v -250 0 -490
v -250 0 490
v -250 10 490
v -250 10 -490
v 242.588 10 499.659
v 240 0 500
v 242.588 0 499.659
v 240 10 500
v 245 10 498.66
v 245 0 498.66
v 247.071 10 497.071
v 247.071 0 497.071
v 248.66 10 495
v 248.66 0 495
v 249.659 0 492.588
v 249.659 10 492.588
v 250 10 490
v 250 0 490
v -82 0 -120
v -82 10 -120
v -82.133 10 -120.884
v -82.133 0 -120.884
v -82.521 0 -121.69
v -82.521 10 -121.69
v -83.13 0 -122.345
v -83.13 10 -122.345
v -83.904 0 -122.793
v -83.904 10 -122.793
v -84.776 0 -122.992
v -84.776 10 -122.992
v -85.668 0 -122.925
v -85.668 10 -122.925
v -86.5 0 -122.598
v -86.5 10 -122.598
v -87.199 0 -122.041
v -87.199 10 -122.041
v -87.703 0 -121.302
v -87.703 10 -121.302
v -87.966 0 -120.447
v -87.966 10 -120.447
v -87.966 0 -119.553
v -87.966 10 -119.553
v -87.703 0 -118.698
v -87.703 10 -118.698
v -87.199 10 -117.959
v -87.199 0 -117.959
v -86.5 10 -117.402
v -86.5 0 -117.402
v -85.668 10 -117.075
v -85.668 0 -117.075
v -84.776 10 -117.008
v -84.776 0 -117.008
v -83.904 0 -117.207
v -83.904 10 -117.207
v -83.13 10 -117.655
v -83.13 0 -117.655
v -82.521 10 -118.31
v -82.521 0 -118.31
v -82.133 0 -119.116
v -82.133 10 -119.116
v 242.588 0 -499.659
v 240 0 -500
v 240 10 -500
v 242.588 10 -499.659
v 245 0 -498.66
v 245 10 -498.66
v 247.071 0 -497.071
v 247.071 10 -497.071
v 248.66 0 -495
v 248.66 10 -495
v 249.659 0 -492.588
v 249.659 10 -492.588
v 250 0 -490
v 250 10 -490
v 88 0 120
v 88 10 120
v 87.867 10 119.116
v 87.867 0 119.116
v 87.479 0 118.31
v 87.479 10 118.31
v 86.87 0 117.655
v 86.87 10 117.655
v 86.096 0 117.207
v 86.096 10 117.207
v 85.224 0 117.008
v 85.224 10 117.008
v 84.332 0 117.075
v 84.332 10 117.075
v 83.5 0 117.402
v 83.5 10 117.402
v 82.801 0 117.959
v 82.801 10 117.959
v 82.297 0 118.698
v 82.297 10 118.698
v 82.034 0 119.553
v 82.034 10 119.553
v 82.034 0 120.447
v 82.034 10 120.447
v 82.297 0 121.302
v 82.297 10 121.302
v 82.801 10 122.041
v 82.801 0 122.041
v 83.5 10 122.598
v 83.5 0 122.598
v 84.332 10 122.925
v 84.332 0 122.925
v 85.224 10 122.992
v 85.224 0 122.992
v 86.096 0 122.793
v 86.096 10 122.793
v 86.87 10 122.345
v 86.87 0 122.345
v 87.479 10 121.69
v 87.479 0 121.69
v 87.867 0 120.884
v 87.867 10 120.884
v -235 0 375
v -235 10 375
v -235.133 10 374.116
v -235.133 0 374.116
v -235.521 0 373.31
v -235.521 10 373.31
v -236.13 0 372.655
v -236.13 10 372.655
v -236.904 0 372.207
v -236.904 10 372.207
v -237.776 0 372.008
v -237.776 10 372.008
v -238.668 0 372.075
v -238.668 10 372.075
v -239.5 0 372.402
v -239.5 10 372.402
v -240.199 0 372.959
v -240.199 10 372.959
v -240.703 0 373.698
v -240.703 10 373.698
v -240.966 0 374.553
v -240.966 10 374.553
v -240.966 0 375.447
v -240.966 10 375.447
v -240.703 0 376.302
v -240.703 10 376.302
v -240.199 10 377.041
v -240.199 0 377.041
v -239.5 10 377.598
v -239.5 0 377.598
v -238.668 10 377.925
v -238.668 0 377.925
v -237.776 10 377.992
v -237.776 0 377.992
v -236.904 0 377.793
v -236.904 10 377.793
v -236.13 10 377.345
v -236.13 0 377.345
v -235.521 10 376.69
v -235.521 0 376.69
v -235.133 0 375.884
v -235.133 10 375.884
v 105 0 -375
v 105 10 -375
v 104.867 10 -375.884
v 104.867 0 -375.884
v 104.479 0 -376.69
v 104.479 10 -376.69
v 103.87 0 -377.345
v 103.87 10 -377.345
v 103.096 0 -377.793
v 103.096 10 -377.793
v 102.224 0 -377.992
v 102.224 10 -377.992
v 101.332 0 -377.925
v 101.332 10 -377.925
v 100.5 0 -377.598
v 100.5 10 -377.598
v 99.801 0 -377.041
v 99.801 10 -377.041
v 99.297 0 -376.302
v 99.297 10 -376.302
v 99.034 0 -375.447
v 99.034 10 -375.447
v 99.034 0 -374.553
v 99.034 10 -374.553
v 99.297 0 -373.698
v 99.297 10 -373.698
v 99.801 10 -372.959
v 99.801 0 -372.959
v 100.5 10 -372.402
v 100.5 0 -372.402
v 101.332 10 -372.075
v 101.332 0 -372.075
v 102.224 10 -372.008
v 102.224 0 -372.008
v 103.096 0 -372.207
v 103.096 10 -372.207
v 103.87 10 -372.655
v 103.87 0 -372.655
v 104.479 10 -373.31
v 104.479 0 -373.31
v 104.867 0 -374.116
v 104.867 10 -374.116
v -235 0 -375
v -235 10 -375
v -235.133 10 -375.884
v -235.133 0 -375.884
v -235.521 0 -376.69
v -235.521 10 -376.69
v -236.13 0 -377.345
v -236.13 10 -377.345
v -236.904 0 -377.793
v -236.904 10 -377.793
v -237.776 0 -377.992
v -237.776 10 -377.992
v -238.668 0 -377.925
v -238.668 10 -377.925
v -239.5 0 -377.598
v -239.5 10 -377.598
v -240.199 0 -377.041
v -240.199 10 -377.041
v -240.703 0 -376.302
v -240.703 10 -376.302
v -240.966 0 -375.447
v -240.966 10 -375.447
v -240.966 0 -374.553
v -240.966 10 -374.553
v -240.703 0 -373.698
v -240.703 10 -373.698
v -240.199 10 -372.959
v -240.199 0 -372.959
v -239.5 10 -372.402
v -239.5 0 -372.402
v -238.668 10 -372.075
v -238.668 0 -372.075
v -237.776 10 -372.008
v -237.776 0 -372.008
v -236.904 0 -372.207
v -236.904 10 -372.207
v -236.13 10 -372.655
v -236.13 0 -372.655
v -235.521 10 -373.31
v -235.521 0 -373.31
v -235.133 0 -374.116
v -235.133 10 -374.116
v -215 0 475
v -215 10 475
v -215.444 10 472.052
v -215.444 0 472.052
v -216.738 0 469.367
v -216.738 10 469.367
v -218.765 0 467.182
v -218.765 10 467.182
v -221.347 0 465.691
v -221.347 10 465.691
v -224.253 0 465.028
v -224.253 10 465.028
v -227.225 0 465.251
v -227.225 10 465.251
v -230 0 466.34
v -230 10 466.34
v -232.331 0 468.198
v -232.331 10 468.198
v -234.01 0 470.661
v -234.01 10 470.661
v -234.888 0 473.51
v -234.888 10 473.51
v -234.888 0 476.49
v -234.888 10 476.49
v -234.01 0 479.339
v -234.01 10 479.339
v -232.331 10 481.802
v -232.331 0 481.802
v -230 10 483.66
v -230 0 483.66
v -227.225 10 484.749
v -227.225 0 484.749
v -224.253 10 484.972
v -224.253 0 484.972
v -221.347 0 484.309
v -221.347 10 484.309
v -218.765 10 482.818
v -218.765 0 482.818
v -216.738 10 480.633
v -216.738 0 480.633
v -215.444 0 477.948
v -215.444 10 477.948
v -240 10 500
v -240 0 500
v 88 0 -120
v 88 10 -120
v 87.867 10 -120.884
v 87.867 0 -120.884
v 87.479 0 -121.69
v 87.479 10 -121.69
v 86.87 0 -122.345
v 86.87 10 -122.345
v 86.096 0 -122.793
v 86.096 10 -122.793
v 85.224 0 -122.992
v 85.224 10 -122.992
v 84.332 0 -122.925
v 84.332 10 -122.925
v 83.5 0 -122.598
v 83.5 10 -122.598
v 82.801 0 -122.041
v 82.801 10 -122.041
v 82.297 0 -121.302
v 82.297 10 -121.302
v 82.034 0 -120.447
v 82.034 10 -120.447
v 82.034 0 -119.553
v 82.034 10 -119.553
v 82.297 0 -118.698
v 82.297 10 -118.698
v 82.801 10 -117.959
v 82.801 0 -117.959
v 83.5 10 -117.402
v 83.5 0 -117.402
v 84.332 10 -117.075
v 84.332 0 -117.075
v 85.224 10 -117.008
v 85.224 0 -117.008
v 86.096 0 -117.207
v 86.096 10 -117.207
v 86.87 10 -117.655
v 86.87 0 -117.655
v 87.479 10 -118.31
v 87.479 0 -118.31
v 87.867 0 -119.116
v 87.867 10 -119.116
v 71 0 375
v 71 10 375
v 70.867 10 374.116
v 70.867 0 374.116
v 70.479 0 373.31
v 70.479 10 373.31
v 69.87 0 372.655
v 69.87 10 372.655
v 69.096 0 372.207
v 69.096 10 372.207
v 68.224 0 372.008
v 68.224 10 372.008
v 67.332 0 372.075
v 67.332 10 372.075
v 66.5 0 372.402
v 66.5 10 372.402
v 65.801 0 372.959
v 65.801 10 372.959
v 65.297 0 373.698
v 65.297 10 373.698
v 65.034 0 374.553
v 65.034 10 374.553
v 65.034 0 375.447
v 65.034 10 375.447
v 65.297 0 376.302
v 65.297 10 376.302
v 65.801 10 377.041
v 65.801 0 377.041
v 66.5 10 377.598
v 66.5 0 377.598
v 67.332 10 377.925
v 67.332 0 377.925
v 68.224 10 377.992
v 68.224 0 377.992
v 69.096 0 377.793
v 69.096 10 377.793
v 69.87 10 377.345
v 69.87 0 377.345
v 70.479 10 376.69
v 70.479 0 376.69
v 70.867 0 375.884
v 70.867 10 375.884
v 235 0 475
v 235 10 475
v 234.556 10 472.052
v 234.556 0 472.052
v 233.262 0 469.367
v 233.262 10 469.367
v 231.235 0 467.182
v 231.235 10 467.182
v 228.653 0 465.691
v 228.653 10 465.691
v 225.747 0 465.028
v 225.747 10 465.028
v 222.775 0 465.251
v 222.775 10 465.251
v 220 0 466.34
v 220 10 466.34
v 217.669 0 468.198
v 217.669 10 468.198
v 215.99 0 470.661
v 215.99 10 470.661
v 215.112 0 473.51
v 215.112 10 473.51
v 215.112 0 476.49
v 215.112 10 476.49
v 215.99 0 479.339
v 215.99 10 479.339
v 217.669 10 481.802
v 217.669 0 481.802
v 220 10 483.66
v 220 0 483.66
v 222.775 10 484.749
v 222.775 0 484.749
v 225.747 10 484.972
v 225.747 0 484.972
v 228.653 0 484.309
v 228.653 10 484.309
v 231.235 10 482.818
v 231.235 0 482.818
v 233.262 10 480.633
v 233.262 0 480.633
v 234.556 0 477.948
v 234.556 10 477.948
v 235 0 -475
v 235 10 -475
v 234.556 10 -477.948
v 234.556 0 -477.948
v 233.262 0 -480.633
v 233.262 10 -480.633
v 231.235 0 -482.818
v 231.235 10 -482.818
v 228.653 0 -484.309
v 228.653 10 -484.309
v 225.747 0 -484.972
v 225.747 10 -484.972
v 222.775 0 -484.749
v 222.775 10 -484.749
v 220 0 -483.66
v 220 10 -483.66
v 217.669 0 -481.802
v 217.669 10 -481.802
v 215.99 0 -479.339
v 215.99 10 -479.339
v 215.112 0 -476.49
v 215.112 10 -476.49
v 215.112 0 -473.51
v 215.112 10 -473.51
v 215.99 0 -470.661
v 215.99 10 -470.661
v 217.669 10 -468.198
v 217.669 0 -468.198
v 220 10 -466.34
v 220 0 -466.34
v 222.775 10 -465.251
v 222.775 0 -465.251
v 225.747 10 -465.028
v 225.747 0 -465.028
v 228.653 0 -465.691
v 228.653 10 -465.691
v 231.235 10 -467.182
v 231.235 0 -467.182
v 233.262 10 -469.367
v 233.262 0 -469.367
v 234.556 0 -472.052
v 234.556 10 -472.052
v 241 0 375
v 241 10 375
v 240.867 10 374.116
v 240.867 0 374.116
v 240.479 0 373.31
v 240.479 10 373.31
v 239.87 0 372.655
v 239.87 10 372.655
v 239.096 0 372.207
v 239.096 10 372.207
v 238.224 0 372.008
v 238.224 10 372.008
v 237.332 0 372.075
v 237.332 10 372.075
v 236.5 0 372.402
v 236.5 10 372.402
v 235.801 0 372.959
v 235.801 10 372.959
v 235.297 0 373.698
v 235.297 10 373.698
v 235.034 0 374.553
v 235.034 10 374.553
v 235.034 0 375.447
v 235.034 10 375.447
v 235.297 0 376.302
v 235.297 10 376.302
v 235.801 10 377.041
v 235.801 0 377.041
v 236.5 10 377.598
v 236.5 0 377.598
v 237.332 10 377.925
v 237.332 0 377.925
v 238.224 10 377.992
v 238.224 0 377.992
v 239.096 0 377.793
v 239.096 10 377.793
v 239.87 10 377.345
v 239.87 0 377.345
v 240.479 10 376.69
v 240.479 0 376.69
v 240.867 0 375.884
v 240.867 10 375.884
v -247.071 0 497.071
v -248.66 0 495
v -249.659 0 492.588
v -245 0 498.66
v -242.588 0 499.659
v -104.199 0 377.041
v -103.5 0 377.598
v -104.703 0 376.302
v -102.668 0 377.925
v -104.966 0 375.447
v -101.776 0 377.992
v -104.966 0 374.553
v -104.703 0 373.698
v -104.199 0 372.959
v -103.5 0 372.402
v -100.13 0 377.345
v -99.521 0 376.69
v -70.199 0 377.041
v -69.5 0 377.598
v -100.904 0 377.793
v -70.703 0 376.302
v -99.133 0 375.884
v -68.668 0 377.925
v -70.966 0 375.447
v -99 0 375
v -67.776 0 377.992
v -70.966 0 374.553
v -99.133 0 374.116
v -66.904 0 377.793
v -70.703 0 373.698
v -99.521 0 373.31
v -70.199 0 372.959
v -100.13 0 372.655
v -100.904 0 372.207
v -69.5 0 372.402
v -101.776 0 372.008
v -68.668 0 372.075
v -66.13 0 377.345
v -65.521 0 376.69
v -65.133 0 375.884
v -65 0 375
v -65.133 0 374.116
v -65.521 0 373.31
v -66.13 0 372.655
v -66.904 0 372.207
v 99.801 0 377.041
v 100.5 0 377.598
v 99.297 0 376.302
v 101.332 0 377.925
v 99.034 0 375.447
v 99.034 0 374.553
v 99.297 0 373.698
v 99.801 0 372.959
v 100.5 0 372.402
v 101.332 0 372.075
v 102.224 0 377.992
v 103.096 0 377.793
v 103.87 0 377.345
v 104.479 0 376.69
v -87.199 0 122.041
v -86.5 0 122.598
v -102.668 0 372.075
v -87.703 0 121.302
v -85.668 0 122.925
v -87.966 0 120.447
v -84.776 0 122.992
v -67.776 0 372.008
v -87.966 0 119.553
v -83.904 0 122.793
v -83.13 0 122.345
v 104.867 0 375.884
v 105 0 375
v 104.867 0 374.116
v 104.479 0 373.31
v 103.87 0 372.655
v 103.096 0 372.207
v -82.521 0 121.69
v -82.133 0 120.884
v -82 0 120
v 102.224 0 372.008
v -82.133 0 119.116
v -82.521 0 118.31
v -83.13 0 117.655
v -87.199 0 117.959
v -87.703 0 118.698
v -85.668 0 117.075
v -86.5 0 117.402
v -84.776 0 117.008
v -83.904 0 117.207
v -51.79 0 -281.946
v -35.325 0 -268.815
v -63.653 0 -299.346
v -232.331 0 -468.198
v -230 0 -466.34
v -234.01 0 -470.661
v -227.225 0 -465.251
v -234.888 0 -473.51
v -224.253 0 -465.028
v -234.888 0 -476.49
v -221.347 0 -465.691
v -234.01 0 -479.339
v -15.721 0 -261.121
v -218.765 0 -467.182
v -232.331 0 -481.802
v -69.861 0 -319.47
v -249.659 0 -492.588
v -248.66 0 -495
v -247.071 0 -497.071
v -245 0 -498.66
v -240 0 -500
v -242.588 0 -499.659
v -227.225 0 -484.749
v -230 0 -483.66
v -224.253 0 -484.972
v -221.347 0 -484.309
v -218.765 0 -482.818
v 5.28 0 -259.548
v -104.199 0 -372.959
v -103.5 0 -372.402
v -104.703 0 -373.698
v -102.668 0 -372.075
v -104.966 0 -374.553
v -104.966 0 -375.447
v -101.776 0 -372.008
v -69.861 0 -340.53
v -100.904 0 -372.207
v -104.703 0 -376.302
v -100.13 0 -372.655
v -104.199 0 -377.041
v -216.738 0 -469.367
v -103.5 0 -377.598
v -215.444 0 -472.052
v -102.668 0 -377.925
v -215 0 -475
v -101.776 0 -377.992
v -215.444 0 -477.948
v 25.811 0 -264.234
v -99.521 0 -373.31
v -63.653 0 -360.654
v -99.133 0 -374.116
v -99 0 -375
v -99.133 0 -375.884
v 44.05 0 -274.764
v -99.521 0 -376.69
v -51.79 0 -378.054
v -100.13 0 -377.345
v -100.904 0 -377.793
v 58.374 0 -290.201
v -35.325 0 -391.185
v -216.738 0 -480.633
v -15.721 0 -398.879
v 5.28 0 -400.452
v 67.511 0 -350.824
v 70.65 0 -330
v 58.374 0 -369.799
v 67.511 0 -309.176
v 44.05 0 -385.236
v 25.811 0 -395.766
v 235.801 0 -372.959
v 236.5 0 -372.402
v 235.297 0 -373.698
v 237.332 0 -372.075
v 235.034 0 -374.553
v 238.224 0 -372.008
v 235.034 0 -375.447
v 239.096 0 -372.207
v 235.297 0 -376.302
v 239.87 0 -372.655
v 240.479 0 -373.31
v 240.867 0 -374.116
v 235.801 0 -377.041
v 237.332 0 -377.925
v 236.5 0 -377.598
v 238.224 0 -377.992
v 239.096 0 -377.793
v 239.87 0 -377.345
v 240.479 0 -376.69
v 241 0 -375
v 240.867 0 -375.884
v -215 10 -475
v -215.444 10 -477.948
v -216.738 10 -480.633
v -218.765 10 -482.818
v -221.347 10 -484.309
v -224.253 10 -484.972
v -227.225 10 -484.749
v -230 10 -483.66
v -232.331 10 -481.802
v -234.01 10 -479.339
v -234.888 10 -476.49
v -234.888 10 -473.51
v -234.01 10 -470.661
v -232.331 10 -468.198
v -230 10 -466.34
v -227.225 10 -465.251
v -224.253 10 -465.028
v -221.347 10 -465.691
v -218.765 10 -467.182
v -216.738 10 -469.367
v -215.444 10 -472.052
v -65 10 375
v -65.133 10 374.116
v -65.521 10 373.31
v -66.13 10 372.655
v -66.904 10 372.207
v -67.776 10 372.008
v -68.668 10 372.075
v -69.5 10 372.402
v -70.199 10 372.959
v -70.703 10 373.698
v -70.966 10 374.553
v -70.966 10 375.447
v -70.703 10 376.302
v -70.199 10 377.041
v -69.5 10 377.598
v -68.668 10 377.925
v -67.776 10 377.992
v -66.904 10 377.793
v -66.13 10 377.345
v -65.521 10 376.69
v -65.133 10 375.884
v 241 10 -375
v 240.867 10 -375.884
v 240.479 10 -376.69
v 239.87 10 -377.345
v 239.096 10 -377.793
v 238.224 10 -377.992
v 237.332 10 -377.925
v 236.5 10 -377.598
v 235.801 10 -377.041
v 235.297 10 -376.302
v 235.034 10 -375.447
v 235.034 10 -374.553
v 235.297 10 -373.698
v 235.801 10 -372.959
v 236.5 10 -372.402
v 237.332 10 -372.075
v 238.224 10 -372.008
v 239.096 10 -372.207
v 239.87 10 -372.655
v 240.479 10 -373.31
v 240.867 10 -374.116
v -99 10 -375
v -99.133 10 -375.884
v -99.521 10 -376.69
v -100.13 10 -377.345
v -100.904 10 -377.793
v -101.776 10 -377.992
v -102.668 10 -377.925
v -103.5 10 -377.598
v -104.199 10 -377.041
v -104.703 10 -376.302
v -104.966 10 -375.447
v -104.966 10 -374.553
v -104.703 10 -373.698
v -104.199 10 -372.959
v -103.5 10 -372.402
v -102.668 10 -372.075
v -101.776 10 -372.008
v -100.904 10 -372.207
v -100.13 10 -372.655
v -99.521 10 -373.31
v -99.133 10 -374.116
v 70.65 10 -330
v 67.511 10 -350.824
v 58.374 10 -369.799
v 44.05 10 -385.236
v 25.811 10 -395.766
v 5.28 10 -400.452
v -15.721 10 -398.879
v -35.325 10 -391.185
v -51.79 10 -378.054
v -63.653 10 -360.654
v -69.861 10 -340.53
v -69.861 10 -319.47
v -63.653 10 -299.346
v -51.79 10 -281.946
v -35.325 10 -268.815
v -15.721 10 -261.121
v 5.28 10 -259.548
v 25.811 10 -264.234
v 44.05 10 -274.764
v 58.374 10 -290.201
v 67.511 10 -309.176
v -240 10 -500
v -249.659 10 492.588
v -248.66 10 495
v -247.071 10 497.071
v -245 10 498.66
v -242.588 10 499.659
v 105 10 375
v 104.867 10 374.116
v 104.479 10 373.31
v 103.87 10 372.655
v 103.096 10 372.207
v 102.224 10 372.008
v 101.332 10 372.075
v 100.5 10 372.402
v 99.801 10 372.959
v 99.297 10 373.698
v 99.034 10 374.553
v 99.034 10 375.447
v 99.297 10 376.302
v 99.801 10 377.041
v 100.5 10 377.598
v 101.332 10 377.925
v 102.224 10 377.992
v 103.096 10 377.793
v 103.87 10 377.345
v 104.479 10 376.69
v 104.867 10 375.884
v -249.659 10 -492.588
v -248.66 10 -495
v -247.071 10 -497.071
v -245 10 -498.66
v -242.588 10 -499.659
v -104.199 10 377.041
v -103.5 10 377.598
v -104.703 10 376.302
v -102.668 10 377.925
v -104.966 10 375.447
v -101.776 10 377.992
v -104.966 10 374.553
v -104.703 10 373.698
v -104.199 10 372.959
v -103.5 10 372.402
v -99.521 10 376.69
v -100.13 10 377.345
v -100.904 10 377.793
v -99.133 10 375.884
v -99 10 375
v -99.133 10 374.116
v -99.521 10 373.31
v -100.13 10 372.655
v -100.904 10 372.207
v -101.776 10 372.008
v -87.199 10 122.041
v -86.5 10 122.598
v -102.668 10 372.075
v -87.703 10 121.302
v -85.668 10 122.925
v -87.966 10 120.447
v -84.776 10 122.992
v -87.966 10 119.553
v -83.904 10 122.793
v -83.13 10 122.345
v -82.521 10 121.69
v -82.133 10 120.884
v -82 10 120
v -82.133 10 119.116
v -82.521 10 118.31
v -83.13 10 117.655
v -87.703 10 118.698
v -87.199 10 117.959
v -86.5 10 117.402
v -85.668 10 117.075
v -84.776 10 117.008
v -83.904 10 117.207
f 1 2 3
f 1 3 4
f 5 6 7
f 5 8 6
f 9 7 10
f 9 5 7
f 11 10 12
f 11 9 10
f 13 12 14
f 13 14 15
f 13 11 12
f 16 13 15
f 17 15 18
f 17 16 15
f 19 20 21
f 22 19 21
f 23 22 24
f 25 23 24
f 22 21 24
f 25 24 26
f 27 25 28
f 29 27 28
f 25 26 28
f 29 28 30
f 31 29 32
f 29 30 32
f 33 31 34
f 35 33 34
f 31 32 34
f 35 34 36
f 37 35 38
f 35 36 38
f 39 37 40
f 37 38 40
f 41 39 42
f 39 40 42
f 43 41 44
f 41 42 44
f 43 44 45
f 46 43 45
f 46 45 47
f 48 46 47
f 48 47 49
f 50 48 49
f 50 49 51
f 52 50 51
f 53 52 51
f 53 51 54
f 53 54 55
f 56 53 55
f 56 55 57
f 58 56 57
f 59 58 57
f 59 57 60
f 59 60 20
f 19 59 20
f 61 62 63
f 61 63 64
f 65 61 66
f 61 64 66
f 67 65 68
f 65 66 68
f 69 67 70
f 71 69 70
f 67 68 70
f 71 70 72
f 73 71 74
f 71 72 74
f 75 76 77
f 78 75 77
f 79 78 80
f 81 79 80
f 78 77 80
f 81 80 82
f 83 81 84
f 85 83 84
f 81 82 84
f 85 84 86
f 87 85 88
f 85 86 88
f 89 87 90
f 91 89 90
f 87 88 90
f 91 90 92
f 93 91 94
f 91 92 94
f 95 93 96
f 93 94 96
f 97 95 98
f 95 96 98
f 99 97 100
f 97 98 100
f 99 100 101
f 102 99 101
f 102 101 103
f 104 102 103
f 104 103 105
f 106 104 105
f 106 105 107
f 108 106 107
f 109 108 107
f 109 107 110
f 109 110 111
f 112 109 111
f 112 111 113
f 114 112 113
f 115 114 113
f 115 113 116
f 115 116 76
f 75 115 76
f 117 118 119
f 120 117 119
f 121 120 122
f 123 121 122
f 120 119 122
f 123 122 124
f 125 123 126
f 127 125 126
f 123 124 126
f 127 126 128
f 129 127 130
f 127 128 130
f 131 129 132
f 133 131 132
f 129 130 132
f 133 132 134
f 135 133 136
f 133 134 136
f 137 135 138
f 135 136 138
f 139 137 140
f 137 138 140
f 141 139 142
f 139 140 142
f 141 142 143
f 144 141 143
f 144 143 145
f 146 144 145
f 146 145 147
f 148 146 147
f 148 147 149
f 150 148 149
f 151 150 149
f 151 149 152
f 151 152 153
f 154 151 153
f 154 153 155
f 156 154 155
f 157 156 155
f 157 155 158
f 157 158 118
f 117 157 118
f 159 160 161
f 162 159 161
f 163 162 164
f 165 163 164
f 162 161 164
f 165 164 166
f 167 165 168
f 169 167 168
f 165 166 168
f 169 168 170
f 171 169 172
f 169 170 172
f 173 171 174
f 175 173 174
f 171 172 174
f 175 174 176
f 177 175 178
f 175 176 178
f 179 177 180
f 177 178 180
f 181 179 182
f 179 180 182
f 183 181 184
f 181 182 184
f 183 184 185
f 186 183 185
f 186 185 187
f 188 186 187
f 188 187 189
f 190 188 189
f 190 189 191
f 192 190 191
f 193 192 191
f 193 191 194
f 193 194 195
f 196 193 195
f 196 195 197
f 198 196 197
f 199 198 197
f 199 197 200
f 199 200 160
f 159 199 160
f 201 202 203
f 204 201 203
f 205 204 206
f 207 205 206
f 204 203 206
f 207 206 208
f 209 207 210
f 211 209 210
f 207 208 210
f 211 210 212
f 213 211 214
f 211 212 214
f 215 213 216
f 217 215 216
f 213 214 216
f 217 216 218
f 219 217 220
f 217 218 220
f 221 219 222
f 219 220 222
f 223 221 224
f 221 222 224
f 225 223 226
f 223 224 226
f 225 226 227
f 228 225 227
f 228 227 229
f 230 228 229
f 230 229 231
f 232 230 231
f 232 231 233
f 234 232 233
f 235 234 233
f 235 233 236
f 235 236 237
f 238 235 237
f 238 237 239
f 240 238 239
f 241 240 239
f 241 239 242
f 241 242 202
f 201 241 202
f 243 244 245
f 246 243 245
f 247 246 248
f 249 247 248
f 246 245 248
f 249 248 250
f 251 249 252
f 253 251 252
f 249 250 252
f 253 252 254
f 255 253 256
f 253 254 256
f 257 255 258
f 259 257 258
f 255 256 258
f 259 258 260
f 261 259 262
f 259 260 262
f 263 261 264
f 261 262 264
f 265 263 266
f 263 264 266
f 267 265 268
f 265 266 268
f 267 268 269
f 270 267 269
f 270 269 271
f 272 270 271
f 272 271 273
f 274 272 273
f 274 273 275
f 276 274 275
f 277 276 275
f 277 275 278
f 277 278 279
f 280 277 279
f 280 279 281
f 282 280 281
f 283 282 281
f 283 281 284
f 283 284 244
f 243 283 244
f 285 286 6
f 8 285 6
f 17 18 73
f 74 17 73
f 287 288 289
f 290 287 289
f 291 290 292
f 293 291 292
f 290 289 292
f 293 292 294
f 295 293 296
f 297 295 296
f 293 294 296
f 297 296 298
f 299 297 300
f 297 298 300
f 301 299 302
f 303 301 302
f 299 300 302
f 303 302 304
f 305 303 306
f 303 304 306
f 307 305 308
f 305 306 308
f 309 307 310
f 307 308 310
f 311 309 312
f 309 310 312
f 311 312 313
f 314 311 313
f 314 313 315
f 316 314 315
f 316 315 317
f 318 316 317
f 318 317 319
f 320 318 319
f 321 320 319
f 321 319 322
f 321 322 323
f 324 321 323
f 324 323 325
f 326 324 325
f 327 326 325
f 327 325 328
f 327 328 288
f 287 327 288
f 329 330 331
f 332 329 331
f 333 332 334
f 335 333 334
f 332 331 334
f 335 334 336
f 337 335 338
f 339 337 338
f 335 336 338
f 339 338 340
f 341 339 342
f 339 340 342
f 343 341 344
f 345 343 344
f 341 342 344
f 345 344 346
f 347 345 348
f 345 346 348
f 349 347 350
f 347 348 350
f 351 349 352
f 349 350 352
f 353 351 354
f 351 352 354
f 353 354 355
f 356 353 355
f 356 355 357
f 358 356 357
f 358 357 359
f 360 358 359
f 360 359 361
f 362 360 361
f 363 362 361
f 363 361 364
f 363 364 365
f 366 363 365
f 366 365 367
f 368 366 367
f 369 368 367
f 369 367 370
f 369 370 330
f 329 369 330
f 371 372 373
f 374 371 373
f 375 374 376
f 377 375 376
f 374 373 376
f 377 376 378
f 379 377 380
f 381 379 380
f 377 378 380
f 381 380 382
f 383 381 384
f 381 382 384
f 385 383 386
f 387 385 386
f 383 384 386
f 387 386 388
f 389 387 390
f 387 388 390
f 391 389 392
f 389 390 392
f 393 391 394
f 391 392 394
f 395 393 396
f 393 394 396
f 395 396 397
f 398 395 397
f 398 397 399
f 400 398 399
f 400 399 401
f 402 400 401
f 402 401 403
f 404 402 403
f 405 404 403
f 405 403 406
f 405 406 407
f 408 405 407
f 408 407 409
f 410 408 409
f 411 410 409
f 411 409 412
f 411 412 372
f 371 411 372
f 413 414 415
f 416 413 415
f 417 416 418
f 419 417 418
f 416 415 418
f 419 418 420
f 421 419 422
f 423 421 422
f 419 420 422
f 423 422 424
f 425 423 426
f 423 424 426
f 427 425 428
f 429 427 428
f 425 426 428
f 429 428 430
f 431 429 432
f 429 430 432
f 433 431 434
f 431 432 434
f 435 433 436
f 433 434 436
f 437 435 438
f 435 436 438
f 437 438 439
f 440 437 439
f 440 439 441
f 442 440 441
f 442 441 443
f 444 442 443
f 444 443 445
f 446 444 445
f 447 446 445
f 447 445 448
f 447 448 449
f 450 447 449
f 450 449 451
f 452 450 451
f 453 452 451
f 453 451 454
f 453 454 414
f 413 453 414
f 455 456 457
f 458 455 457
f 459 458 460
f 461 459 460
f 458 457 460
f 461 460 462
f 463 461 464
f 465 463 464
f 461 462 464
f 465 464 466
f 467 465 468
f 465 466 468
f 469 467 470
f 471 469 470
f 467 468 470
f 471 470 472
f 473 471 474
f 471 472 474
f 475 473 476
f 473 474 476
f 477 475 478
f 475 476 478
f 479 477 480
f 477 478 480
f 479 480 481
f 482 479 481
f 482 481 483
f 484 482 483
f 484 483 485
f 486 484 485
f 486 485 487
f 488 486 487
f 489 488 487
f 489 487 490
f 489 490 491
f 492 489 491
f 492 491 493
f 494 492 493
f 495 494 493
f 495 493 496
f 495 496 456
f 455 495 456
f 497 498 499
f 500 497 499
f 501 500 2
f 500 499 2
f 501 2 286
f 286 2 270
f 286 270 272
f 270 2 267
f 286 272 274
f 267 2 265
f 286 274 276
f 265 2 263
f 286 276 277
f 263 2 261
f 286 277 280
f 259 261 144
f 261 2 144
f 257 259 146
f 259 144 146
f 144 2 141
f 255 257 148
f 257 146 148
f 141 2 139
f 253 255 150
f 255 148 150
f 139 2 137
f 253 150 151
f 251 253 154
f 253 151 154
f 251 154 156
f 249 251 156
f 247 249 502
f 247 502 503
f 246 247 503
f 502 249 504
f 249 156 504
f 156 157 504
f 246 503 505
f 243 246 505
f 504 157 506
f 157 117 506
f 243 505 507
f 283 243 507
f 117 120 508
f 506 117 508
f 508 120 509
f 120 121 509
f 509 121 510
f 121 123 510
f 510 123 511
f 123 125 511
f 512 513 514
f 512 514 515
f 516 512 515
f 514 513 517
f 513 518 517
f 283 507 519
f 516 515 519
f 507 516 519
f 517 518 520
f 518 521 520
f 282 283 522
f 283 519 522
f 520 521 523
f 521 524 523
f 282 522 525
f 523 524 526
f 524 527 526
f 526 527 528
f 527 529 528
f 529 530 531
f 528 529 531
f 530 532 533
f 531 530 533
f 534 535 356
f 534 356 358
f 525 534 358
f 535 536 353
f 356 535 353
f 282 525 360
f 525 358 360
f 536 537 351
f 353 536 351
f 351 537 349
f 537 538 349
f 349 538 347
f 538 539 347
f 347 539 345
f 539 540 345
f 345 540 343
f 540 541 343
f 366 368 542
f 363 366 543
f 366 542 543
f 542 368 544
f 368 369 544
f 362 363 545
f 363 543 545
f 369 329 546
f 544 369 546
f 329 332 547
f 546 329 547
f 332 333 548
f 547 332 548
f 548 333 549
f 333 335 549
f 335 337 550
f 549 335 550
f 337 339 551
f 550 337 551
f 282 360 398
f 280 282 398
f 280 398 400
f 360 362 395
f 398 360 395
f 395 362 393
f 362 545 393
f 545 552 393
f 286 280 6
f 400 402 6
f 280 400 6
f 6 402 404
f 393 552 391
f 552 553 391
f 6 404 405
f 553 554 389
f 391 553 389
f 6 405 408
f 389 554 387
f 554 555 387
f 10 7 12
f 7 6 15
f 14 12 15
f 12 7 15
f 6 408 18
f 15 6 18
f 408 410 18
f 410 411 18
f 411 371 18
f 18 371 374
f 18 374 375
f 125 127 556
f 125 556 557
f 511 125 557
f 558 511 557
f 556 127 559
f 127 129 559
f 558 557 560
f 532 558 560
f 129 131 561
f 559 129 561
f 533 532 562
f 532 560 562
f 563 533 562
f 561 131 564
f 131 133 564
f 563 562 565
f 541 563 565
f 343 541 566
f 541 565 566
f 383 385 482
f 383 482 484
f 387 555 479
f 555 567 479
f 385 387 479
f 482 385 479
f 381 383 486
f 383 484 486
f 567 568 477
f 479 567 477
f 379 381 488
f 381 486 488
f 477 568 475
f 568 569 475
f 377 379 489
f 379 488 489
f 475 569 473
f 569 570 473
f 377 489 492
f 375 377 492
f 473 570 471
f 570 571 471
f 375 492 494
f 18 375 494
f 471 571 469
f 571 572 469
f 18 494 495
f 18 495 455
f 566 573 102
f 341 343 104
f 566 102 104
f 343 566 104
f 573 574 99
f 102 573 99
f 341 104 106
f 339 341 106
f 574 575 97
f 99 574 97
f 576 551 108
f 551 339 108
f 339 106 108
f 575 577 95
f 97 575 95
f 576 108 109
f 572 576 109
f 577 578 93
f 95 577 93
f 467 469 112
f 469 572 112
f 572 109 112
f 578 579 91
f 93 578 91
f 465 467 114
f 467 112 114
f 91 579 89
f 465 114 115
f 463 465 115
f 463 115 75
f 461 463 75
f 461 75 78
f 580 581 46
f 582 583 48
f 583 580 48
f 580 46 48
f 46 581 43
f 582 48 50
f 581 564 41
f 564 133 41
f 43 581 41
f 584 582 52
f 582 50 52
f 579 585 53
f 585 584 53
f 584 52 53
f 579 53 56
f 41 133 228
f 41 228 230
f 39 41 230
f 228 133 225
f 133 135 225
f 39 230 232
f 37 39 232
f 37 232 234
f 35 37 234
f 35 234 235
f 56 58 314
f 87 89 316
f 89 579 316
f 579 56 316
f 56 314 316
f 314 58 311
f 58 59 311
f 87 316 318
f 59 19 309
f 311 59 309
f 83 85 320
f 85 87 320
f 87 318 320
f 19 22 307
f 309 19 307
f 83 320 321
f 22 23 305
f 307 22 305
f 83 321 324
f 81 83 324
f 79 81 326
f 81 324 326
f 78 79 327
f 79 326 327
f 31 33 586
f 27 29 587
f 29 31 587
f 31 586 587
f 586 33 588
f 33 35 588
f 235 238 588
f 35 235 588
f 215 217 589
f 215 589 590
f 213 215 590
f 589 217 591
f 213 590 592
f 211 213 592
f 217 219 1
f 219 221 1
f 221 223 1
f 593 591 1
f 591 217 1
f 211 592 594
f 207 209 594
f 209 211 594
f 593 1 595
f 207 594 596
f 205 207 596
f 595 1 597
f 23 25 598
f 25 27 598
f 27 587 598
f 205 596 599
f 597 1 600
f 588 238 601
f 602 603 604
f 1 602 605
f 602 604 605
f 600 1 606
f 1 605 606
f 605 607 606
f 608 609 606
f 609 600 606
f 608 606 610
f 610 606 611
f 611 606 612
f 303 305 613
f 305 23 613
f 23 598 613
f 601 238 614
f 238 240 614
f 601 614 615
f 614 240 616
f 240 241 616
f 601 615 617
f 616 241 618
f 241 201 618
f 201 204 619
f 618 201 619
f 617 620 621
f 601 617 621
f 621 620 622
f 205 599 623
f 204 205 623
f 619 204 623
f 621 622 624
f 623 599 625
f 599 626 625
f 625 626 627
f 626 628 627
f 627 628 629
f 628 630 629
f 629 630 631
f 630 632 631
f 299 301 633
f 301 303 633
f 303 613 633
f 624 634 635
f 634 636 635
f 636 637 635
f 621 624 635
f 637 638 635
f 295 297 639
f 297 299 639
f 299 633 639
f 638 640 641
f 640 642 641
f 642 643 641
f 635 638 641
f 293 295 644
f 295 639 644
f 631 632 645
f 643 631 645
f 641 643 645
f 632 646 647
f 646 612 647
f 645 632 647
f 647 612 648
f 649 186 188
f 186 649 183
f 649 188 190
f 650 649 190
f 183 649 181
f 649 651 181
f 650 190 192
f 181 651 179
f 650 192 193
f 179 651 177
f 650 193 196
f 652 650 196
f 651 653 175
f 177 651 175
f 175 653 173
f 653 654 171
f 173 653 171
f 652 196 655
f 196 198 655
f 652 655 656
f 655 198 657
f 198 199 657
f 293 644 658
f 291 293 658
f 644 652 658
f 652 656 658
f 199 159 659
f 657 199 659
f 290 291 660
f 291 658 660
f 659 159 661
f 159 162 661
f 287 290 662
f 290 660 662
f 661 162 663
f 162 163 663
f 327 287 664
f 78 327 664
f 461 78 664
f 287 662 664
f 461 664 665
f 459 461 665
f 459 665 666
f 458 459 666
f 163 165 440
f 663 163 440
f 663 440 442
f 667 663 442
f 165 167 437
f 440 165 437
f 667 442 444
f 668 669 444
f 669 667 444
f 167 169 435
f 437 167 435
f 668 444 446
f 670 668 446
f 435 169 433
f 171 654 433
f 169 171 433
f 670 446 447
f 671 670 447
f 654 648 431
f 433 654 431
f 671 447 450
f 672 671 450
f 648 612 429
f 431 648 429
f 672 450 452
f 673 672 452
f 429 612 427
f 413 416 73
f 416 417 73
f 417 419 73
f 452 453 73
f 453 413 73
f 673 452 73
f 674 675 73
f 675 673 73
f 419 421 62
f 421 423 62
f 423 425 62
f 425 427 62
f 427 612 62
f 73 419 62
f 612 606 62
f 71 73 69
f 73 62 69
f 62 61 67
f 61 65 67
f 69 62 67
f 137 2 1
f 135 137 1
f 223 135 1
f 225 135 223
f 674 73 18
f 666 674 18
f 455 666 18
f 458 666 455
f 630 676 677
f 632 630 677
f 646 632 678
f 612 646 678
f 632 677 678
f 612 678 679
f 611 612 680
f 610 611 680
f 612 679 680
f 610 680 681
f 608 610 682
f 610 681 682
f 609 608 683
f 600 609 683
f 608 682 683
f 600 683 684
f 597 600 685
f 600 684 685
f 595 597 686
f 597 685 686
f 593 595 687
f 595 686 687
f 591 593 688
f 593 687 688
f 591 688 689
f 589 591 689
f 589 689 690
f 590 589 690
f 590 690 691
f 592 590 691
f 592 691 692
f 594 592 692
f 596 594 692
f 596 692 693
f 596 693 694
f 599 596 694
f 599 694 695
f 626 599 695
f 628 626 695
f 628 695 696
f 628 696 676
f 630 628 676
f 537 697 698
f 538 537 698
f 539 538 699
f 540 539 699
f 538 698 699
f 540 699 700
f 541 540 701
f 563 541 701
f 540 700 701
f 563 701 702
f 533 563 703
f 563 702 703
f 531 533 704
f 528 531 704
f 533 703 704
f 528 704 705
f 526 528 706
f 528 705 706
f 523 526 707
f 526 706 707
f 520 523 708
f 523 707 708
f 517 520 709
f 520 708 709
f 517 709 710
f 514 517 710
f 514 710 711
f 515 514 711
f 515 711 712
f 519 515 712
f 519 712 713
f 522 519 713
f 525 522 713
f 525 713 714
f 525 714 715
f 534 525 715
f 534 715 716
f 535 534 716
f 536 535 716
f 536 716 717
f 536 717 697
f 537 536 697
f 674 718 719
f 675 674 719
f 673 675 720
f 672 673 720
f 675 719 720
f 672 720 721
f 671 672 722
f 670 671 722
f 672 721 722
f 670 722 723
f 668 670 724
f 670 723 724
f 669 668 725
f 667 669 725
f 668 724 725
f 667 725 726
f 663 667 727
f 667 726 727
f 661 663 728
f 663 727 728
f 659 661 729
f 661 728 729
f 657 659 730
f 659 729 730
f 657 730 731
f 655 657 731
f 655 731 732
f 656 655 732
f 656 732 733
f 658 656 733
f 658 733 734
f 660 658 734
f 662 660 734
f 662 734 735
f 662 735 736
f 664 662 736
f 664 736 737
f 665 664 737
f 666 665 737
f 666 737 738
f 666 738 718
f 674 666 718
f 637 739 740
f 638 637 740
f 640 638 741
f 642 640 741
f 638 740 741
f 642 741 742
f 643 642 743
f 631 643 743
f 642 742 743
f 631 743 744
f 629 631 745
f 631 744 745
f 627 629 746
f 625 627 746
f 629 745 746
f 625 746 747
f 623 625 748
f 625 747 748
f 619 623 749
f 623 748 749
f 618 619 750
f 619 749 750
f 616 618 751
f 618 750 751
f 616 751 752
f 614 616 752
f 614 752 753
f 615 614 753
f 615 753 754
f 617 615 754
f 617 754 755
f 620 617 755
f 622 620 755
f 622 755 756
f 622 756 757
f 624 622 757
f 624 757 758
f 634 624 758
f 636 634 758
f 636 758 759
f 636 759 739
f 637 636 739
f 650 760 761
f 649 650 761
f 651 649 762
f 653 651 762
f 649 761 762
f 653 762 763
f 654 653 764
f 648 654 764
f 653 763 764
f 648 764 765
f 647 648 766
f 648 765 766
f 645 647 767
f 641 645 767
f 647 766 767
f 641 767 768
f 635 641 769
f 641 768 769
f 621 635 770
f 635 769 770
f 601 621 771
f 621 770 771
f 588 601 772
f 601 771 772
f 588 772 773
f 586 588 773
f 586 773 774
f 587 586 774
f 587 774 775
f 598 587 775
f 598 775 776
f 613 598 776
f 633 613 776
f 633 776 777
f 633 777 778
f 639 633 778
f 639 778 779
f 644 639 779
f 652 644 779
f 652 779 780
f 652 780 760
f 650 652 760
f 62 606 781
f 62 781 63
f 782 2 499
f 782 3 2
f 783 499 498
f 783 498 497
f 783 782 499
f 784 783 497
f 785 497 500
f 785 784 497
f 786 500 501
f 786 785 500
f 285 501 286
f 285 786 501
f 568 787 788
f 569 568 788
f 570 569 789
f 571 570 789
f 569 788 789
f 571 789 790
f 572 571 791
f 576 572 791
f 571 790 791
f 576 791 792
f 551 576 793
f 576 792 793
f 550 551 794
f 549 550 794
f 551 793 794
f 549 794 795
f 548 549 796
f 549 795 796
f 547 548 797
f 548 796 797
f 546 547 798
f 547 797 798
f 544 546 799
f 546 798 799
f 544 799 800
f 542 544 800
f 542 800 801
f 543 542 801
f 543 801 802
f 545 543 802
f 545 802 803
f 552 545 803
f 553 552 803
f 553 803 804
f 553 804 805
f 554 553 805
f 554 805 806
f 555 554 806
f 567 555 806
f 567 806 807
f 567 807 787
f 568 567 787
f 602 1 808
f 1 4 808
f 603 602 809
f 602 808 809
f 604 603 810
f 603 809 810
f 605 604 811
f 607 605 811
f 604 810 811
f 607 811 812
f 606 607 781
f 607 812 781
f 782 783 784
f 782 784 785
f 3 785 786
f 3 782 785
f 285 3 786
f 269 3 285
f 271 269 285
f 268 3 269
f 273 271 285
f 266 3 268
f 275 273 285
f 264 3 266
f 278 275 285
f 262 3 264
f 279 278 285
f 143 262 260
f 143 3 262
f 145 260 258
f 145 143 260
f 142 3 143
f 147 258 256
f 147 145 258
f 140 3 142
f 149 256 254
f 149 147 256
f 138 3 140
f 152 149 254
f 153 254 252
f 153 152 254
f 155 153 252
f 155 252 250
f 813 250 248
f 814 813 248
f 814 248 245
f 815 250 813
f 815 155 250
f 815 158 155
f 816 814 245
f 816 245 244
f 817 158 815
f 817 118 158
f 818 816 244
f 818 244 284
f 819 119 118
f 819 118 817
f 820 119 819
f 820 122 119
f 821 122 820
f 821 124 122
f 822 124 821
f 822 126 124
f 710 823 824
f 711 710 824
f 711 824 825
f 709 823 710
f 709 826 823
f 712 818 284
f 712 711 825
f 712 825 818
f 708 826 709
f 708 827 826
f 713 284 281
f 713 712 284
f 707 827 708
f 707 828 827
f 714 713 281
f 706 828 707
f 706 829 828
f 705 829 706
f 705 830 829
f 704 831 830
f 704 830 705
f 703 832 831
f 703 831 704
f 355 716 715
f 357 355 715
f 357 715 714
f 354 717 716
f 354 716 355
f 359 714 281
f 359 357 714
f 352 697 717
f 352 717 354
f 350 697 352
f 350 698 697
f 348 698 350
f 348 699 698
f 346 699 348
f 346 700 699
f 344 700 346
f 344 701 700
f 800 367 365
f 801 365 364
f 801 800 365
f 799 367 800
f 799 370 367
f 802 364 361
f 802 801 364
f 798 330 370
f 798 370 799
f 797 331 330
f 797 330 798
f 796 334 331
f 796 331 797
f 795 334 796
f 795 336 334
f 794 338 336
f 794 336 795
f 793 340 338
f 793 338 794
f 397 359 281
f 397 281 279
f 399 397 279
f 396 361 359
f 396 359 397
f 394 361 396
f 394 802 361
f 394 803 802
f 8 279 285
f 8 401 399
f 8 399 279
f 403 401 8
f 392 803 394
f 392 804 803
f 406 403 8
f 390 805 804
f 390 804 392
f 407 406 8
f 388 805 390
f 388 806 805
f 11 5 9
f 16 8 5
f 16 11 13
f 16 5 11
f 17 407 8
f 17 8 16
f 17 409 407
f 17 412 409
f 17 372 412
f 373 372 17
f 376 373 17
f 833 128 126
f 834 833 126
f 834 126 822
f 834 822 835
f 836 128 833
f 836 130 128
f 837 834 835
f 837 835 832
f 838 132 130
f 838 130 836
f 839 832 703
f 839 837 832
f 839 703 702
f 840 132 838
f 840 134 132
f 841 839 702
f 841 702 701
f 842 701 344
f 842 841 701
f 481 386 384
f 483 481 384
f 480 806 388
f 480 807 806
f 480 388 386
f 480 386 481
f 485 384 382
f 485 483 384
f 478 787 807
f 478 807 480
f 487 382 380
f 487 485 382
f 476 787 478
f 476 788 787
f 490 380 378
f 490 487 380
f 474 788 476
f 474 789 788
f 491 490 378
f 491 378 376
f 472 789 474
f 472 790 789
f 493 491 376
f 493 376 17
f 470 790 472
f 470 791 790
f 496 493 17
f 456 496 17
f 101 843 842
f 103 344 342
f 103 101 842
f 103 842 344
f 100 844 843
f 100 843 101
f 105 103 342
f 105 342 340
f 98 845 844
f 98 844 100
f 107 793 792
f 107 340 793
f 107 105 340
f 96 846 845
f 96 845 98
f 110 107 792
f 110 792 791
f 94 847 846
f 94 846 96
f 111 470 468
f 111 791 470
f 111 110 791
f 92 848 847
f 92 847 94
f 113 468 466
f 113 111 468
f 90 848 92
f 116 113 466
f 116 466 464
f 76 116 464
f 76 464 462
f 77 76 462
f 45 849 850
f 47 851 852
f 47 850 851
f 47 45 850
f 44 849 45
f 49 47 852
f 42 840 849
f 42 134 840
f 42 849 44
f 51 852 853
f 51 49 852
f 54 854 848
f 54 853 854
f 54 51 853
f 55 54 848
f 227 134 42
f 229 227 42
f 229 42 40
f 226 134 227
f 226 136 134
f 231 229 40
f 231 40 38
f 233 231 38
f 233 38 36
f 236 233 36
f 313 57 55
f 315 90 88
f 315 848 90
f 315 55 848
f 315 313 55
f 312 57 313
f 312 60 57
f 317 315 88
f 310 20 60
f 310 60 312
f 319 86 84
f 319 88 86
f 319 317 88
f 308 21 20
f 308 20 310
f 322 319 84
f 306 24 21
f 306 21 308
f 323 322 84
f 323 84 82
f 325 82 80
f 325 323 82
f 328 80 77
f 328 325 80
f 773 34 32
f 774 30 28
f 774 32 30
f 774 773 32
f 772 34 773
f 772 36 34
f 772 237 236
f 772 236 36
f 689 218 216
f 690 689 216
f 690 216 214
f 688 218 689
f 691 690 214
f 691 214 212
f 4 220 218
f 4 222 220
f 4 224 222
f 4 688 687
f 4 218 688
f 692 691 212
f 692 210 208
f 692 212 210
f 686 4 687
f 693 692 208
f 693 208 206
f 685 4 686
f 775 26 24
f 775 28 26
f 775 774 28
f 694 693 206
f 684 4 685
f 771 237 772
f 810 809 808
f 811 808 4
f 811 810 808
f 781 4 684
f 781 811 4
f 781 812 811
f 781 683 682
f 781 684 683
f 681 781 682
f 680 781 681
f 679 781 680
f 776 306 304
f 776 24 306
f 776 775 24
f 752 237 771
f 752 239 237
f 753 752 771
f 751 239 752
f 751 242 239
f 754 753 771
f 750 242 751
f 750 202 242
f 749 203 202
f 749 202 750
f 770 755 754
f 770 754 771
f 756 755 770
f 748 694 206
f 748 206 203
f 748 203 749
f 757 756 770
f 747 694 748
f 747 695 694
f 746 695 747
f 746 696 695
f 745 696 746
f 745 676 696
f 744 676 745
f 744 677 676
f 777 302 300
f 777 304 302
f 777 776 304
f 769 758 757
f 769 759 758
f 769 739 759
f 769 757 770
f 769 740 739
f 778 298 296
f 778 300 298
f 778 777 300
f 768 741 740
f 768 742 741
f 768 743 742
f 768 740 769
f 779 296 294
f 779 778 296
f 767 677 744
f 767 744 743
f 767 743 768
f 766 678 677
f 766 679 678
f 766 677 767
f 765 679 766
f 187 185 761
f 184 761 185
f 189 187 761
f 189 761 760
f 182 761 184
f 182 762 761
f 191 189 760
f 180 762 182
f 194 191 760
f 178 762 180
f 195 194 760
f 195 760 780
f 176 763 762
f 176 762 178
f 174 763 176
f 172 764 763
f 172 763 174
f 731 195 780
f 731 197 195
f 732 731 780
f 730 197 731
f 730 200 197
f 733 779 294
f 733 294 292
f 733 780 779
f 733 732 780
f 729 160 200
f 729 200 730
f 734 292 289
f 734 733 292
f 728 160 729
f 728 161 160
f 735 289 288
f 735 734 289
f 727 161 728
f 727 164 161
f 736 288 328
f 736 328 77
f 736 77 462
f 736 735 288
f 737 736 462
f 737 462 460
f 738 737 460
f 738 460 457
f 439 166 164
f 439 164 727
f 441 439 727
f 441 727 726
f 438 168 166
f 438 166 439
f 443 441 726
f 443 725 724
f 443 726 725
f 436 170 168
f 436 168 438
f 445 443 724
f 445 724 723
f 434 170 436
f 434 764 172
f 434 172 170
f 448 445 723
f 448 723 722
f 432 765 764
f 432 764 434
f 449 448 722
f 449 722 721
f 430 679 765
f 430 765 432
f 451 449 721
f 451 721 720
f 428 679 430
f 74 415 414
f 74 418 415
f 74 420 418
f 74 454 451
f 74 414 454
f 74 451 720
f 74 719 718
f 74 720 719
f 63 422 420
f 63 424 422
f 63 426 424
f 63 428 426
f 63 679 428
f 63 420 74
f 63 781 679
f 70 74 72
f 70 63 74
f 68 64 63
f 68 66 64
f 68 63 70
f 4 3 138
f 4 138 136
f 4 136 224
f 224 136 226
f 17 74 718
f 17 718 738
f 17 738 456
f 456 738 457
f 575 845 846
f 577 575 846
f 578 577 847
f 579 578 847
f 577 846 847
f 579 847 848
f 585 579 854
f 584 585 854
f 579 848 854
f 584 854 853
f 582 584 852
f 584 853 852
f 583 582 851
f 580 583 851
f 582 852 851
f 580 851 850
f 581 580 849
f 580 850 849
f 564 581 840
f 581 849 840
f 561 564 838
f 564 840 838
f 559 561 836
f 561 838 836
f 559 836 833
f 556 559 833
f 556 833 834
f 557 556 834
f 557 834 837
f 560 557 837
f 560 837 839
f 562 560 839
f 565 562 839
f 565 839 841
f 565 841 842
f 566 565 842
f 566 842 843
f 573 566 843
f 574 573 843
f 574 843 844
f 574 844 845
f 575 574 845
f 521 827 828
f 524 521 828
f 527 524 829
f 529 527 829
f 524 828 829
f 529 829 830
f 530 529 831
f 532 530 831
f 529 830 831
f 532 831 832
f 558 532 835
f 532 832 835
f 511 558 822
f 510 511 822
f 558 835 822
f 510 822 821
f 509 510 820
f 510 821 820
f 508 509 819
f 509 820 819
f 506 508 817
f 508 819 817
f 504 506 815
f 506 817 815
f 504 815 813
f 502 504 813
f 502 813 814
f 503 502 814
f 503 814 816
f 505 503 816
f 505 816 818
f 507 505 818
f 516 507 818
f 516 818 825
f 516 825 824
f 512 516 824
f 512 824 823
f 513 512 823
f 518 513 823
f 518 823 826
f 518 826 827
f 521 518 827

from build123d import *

# Parameters (mm, degrees)
SKETCH1_W                  = 500
SKETCH1_H                  = 1000
BOSS_EXTRUDE1_DEPTH        = 10
LO_BAT_XUONG_DAT_REACH     = 12
SKETCH2_R                  = 10
FILLET1_R                  = 10
CUT_EXTRUDE2_REACH         = 12
SKETCH3_R                  = 70.65
BAT_CHAN_DE_KHOP_NOI_REACH = 12
SKETCH4_R                  = 3
CUT_EXTRUDE3_REACH         = 12
SKETCH6_R                  = 3


with BuildPart() as part:
    # Sketch1 → Boss-Extrude1 (new body)
    with BuildSketch(Plane(origin=(0, 0, 0), x_dir=(1, 0, 0), z_dir=(0, 1, 0))):
        Rectangle(SKETCH1_W, SKETCH1_H)
    extrude(amount=BOSS_EXTRUDE1_DEPTH)

    # Sketch2 → lo bat xuong dat (cut, up to next)
    with BuildSketch(Plane(origin=(0, 10, 0), x_dir=(1, 0, 0), z_dir=(0, 1, 0)), mode=Mode.PRIVATE) as lo_bat_xuong_dat_sk1:
        with Locations((-225, 475)):
            Circle(SKETCH2_R)
    lo_bat_xuong_dat_tool1 = extrude(lo_bat_xuong_dat_sk1.sketch, amount=-LO_BAT_XUONG_DAT_REACH, mode=Mode.PRIVATE) & part.part
    add(lo_bat_xuong_dat_tool1.solids().sort_by_distance((-225, 10, -475))[0], mode=Mode.SUBTRACT)
    # Sketch2 → lo bat xuong dat (cut, up to next)
    with BuildSketch(Plane(origin=(0, 10, 0), x_dir=(1, 0, 0), z_dir=(0, 1, 0)), mode=Mode.PRIVATE) as lo_bat_xuong_dat_sk2:
        with Locations((225, 475)):
            Circle(SKETCH2_R)
    lo_bat_xuong_dat_tool2 = extrude(lo_bat_xuong_dat_sk2.sketch, amount=-LO_BAT_XUONG_DAT_REACH, mode=Mode.PRIVATE) & part.part
    add(lo_bat_xuong_dat_tool2.solids().sort_by_distance((225, 10, -475))[0], mode=Mode.SUBTRACT)
    # Sketch2 → lo bat xuong dat (cut, up to next)
    with BuildSketch(Plane(origin=(0, 10, 0), x_dir=(1, 0, 0), z_dir=(0, 1, 0)), mode=Mode.PRIVATE) as lo_bat_xuong_dat_sk3:
        with Locations((-225, -475)):
            Circle(SKETCH2_R)
    lo_bat_xuong_dat_tool3 = extrude(lo_bat_xuong_dat_sk3.sketch, amount=-LO_BAT_XUONG_DAT_REACH, mode=Mode.PRIVATE) & part.part
    add(lo_bat_xuong_dat_tool3.solids().sort_by_distance((-225, 10, 475))[0], mode=Mode.SUBTRACT)
    # Sketch2 → lo bat xuong dat (cut, up to next)
    with BuildSketch(Plane(origin=(0, 10, 0), x_dir=(1, 0, 0), z_dir=(0, 1, 0)), mode=Mode.PRIVATE) as lo_bat_xuong_dat_sk4:
        with Locations((225, -475)):
            Circle(SKETCH2_R)
    lo_bat_xuong_dat_tool4 = extrude(lo_bat_xuong_dat_sk4.sketch, amount=-LO_BAT_XUONG_DAT_REACH, mode=Mode.PRIVATE) & part.part
    add(lo_bat_xuong_dat_tool4.solids().sort_by_distance((225, 10, 475))[0], mode=Mode.SUBTRACT)

    # Fillet1
    fillet1_edges = [part.edges().sort_by_distance(p)[0] for p in [
        (250, 5, 500),
        (-250, 5, 500),
        (-250, 5, -500),
        (250, 5, -500),
    ]]
    fillet(fillet1_edges, radius=FILLET1_R)

    # Sketch3 → Cut-Extrude2 (cut, up to next)
    with BuildSketch(Plane(origin=(0, 10, 0), x_dir=(1, 0, 0), z_dir=(0, 1, 0)), mode=Mode.PRIVATE) as cut_extrude2_sk1:
        with Locations((0, 330)):
            Circle(SKETCH3_R)
    cut_extrude2_tool1 = extrude(cut_extrude2_sk1.sketch, amount=-CUT_EXTRUDE2_REACH, mode=Mode.PRIVATE) & part.part
    add(cut_extrude2_tool1.solids().sort_by_distance((0, 10, -330))[0], mode=Mode.SUBTRACT)

    # Sketch4 → bat chan de khop noi (cut, up to next)
    with BuildSketch(Plane(origin=(0, 10, 0), x_dir=(1, 0, 0), z_dir=(0, 1, 0)), mode=Mode.PRIVATE) as bat_chan_de_khop_noi_sk1:
        with Locations((-85, 120)):
            Circle(SKETCH4_R)
    bat_chan_de_khop_noi_tool1 = extrude(bat_chan_de_khop_noi_sk1.sketch, amount=-BAT_CHAN_DE_KHOP_NOI_REACH, mode=Mode.PRIVATE) & part.part
    add(bat_chan_de_khop_noi_tool1.solids().sort_by_distance((-85, 10, -120))[0], mode=Mode.SUBTRACT)
    # Sketch4 → bat chan de khop noi (cut, up to next)
    with BuildSketch(Plane(origin=(0, 10, 0), x_dir=(1, 0, 0), z_dir=(0, 1, 0)), mode=Mode.PRIVATE) as bat_chan_de_khop_noi_sk2:
        with Locations((85, 120)):
            Circle(SKETCH4_R)
    bat_chan_de_khop_noi_tool2 = extrude(bat_chan_de_khop_noi_sk2.sketch, amount=-BAT_CHAN_DE_KHOP_NOI_REACH, mode=Mode.PRIVATE) & part.part
    add(bat_chan_de_khop_noi_tool2.solids().sort_by_distance((85, 10, -120))[0], mode=Mode.SUBTRACT)
    # Sketch4 → bat chan de khop noi (cut, up to next)
    with BuildSketch(Plane(origin=(0, 10, 0), x_dir=(1, 0, 0), z_dir=(0, 1, 0)), mode=Mode.PRIVATE) as bat_chan_de_khop_noi_sk3:
        with Locations((85, -120)):
            Circle(SKETCH4_R)
    bat_chan_de_khop_noi_tool3 = extrude(bat_chan_de_khop_noi_sk3.sketch, amount=-BAT_CHAN_DE_KHOP_NOI_REACH, mode=Mode.PRIVATE) & part.part
    add(bat_chan_de_khop_noi_tool3.solids().sort_by_distance((85, 10, 120))[0], mode=Mode.SUBTRACT)
    # Sketch4 → bat chan de khop noi (cut, up to next)
    with BuildSketch(Plane(origin=(0, 10, 0), x_dir=(1, 0, 0), z_dir=(0, 1, 0)), mode=Mode.PRIVATE) as bat_chan_de_khop_noi_sk4:
        with Locations((-85, -120)):
            Circle(SKETCH4_R)
    bat_chan_de_khop_noi_tool4 = extrude(bat_chan_de_khop_noi_sk4.sketch, amount=-BAT_CHAN_DE_KHOP_NOI_REACH, mode=Mode.PRIVATE) & part.part
    add(bat_chan_de_khop_noi_tool4.solids().sort_by_distance((-85, 10, 120))[0], mode=Mode.SUBTRACT)

    # Sketch6 → Cut-Extrude3 (cut, up to next)
    with BuildSketch(Plane(origin=(0, 10, 0), x_dir=(1, 0, 0), z_dir=(0, 1, 0)), mode=Mode.PRIVATE) as cut_extrude3_sk1:
        with Locations((238, -375)):
            Circle(SKETCH6_R)
    cut_extrude3_tool1 = extrude(cut_extrude3_sk1.sketch, amount=-CUT_EXTRUDE3_REACH, mode=Mode.PRIVATE) & part.part
    add(cut_extrude3_tool1.solids().sort_by_distance((238, 10, 375))[0], mode=Mode.SUBTRACT)
    # Sketch6 → Cut-Extrude3 (cut, up to next)
    with BuildSketch(Plane(origin=(0, 10, 0), x_dir=(1, 0, 0), z_dir=(0, 1, 0)), mode=Mode.PRIVATE) as cut_extrude3_sk2:
        with Locations((102, -375)):
            Circle(SKETCH6_R)
    cut_extrude3_tool2 = extrude(cut_extrude3_sk2.sketch, amount=-CUT_EXTRUDE3_REACH, mode=Mode.PRIVATE) & part.part
    add(cut_extrude3_tool2.solids().sort_by_distance((102, 10, 375))[0], mode=Mode.SUBTRACT)
    # Sketch6 → Cut-Extrude3 (cut, up to next)
    with BuildSketch(Plane(origin=(0, 10, 0), x_dir=(1, 0, 0), z_dir=(0, 1, 0)), mode=Mode.PRIVATE) as cut_extrude3_sk3:
        with Locations((-102, -375)):
            Circle(SKETCH6_R)
    cut_extrude3_tool3 = extrude(cut_extrude3_sk3.sketch, amount=-CUT_EXTRUDE3_REACH, mode=Mode.PRIVATE) & part.part
    add(cut_extrude3_tool3.solids().sort_by_distance((-102, 10, 375))[0], mode=Mode.SUBTRACT)
    # Sketch6 → Cut-Extrude3 (cut, up to next)
    with BuildSketch(Plane(origin=(0, 10, 0), x_dir=(1, 0, 0), z_dir=(0, 1, 0)), mode=Mode.PRIVATE) as cut_extrude3_sk4:
        with Locations((-238, -375)):
            Circle(SKETCH6_R)
    cut_extrude3_tool4 = extrude(cut_extrude3_sk4.sketch, amount=-CUT_EXTRUDE3_REACH, mode=Mode.PRIVATE) & part.part
    add(cut_extrude3_tool4.solids().sort_by_distance((-238, 10, 375))[0], mode=Mode.SUBTRACT)
    # Sketch6 → Cut-Extrude3 (cut, up to next)
    with BuildSketch(Plane(origin=(0, 10, 0), x_dir=(1, 0, 0), z_dir=(0, 1, 0)), mode=Mode.PRIVATE) as cut_extrude3_sk5:
        with Locations((-238, 375)):
            Circle(SKETCH6_R)
    cut_extrude3_tool5 = extrude(cut_extrude3_sk5.sketch, amount=-CUT_EXTRUDE3_REACH, mode=Mode.PRIVATE) & part.part
    add(cut_extrude3_tool5.solids().sort_by_distance((-238, 10, -375))[0], mode=Mode.SUBTRACT)
    # Sketch6 → Cut-Extrude3 (cut, up to next)
    with BuildSketch(Plane(origin=(0, 10, 0), x_dir=(1, 0, 0), z_dir=(0, 1, 0)), mode=Mode.PRIVATE) as cut_extrude3_sk6:
        with Locations((-102, 375)):
            Circle(SKETCH6_R)
    cut_extrude3_tool6 = extrude(cut_extrude3_sk6.sketch, amount=-CUT_EXTRUDE3_REACH, mode=Mode.PRIVATE) & part.part
    add(cut_extrude3_tool6.solids().sort_by_distance((-102, 10, -375))[0], mode=Mode.SUBTRACT)
    # Sketch6 → Cut-Extrude3 (cut, up to next)
    with BuildSketch(Plane(origin=(0, 10, 0), x_dir=(1, 0, 0), z_dir=(0, 1, 0)), mode=Mode.PRIVATE) as cut_extrude3_sk7:
        with Locations((102, 375)):
            Circle(SKETCH6_R)
    cut_extrude3_tool7 = extrude(cut_extrude3_sk7.sketch, amount=-CUT_EXTRUDE3_REACH, mode=Mode.PRIVATE) & part.part
    add(cut_extrude3_tool7.solids().sort_by_distance((102, 10, -375))[0], mode=Mode.SUBTRACT)
    # Sketch6 → Cut-Extrude3 (cut, up to next)
    with BuildSketch(Plane(origin=(0, 10, 0), x_dir=(1, 0, 0), z_dir=(0, 1, 0)), mode=Mode.PRIVATE) as cut_extrude3_sk8:
        with Locations((238, 375)):
            Circle(SKETCH6_R)
    cut_extrude3_tool8 = extrude(cut_extrude3_sk8.sketch, amount=-CUT_EXTRUDE3_REACH, mode=Mode.PRIVATE) & part.part
    add(cut_extrude3_tool8.solids().sort_by_distance((238, 10, -375))[0], mode=Mode.SUBTRACT)
    # Sketch6 → Cut-Extrude3 (cut, up to next)
    with BuildSketch(Plane(origin=(0, 10, 0), x_dir=(1, 0, 0), z_dir=(0, 1, 0)), mode=Mode.PRIVATE) as cut_extrude3_sk9:
        with Locations((68, -375)):
            Circle(SKETCH6_R)
    cut_extrude3_tool9 = extrude(cut_extrude3_sk9.sketch, amount=-CUT_EXTRUDE3_REACH, mode=Mode.PRIVATE) & part.part
    add(cut_extrude3_tool9.solids().sort_by_distance((68, 10, 375))[0], mode=Mode.SUBTRACT)
    # Sketch6 → Cut-Extrude3 (cut, up to next)
    with BuildSketch(Plane(origin=(0, 10, 0), x_dir=(1, 0, 0), z_dir=(0, 1, 0)), mode=Mode.PRIVATE) as cut_extrude3_sk10:
        with Locations((-68, -375)):
            Circle(SKETCH6_R)
    cut_extrude3_tool10 = extrude(cut_extrude3_sk10.sketch, amount=-CUT_EXTRUDE3_REACH, mode=Mode.PRIVATE) & part.part
    add(cut_extrude3_tool10.solids().sort_by_distance((-68, 10, 375))[0], mode=Mode.SUBTRACT)


solid = part.part
